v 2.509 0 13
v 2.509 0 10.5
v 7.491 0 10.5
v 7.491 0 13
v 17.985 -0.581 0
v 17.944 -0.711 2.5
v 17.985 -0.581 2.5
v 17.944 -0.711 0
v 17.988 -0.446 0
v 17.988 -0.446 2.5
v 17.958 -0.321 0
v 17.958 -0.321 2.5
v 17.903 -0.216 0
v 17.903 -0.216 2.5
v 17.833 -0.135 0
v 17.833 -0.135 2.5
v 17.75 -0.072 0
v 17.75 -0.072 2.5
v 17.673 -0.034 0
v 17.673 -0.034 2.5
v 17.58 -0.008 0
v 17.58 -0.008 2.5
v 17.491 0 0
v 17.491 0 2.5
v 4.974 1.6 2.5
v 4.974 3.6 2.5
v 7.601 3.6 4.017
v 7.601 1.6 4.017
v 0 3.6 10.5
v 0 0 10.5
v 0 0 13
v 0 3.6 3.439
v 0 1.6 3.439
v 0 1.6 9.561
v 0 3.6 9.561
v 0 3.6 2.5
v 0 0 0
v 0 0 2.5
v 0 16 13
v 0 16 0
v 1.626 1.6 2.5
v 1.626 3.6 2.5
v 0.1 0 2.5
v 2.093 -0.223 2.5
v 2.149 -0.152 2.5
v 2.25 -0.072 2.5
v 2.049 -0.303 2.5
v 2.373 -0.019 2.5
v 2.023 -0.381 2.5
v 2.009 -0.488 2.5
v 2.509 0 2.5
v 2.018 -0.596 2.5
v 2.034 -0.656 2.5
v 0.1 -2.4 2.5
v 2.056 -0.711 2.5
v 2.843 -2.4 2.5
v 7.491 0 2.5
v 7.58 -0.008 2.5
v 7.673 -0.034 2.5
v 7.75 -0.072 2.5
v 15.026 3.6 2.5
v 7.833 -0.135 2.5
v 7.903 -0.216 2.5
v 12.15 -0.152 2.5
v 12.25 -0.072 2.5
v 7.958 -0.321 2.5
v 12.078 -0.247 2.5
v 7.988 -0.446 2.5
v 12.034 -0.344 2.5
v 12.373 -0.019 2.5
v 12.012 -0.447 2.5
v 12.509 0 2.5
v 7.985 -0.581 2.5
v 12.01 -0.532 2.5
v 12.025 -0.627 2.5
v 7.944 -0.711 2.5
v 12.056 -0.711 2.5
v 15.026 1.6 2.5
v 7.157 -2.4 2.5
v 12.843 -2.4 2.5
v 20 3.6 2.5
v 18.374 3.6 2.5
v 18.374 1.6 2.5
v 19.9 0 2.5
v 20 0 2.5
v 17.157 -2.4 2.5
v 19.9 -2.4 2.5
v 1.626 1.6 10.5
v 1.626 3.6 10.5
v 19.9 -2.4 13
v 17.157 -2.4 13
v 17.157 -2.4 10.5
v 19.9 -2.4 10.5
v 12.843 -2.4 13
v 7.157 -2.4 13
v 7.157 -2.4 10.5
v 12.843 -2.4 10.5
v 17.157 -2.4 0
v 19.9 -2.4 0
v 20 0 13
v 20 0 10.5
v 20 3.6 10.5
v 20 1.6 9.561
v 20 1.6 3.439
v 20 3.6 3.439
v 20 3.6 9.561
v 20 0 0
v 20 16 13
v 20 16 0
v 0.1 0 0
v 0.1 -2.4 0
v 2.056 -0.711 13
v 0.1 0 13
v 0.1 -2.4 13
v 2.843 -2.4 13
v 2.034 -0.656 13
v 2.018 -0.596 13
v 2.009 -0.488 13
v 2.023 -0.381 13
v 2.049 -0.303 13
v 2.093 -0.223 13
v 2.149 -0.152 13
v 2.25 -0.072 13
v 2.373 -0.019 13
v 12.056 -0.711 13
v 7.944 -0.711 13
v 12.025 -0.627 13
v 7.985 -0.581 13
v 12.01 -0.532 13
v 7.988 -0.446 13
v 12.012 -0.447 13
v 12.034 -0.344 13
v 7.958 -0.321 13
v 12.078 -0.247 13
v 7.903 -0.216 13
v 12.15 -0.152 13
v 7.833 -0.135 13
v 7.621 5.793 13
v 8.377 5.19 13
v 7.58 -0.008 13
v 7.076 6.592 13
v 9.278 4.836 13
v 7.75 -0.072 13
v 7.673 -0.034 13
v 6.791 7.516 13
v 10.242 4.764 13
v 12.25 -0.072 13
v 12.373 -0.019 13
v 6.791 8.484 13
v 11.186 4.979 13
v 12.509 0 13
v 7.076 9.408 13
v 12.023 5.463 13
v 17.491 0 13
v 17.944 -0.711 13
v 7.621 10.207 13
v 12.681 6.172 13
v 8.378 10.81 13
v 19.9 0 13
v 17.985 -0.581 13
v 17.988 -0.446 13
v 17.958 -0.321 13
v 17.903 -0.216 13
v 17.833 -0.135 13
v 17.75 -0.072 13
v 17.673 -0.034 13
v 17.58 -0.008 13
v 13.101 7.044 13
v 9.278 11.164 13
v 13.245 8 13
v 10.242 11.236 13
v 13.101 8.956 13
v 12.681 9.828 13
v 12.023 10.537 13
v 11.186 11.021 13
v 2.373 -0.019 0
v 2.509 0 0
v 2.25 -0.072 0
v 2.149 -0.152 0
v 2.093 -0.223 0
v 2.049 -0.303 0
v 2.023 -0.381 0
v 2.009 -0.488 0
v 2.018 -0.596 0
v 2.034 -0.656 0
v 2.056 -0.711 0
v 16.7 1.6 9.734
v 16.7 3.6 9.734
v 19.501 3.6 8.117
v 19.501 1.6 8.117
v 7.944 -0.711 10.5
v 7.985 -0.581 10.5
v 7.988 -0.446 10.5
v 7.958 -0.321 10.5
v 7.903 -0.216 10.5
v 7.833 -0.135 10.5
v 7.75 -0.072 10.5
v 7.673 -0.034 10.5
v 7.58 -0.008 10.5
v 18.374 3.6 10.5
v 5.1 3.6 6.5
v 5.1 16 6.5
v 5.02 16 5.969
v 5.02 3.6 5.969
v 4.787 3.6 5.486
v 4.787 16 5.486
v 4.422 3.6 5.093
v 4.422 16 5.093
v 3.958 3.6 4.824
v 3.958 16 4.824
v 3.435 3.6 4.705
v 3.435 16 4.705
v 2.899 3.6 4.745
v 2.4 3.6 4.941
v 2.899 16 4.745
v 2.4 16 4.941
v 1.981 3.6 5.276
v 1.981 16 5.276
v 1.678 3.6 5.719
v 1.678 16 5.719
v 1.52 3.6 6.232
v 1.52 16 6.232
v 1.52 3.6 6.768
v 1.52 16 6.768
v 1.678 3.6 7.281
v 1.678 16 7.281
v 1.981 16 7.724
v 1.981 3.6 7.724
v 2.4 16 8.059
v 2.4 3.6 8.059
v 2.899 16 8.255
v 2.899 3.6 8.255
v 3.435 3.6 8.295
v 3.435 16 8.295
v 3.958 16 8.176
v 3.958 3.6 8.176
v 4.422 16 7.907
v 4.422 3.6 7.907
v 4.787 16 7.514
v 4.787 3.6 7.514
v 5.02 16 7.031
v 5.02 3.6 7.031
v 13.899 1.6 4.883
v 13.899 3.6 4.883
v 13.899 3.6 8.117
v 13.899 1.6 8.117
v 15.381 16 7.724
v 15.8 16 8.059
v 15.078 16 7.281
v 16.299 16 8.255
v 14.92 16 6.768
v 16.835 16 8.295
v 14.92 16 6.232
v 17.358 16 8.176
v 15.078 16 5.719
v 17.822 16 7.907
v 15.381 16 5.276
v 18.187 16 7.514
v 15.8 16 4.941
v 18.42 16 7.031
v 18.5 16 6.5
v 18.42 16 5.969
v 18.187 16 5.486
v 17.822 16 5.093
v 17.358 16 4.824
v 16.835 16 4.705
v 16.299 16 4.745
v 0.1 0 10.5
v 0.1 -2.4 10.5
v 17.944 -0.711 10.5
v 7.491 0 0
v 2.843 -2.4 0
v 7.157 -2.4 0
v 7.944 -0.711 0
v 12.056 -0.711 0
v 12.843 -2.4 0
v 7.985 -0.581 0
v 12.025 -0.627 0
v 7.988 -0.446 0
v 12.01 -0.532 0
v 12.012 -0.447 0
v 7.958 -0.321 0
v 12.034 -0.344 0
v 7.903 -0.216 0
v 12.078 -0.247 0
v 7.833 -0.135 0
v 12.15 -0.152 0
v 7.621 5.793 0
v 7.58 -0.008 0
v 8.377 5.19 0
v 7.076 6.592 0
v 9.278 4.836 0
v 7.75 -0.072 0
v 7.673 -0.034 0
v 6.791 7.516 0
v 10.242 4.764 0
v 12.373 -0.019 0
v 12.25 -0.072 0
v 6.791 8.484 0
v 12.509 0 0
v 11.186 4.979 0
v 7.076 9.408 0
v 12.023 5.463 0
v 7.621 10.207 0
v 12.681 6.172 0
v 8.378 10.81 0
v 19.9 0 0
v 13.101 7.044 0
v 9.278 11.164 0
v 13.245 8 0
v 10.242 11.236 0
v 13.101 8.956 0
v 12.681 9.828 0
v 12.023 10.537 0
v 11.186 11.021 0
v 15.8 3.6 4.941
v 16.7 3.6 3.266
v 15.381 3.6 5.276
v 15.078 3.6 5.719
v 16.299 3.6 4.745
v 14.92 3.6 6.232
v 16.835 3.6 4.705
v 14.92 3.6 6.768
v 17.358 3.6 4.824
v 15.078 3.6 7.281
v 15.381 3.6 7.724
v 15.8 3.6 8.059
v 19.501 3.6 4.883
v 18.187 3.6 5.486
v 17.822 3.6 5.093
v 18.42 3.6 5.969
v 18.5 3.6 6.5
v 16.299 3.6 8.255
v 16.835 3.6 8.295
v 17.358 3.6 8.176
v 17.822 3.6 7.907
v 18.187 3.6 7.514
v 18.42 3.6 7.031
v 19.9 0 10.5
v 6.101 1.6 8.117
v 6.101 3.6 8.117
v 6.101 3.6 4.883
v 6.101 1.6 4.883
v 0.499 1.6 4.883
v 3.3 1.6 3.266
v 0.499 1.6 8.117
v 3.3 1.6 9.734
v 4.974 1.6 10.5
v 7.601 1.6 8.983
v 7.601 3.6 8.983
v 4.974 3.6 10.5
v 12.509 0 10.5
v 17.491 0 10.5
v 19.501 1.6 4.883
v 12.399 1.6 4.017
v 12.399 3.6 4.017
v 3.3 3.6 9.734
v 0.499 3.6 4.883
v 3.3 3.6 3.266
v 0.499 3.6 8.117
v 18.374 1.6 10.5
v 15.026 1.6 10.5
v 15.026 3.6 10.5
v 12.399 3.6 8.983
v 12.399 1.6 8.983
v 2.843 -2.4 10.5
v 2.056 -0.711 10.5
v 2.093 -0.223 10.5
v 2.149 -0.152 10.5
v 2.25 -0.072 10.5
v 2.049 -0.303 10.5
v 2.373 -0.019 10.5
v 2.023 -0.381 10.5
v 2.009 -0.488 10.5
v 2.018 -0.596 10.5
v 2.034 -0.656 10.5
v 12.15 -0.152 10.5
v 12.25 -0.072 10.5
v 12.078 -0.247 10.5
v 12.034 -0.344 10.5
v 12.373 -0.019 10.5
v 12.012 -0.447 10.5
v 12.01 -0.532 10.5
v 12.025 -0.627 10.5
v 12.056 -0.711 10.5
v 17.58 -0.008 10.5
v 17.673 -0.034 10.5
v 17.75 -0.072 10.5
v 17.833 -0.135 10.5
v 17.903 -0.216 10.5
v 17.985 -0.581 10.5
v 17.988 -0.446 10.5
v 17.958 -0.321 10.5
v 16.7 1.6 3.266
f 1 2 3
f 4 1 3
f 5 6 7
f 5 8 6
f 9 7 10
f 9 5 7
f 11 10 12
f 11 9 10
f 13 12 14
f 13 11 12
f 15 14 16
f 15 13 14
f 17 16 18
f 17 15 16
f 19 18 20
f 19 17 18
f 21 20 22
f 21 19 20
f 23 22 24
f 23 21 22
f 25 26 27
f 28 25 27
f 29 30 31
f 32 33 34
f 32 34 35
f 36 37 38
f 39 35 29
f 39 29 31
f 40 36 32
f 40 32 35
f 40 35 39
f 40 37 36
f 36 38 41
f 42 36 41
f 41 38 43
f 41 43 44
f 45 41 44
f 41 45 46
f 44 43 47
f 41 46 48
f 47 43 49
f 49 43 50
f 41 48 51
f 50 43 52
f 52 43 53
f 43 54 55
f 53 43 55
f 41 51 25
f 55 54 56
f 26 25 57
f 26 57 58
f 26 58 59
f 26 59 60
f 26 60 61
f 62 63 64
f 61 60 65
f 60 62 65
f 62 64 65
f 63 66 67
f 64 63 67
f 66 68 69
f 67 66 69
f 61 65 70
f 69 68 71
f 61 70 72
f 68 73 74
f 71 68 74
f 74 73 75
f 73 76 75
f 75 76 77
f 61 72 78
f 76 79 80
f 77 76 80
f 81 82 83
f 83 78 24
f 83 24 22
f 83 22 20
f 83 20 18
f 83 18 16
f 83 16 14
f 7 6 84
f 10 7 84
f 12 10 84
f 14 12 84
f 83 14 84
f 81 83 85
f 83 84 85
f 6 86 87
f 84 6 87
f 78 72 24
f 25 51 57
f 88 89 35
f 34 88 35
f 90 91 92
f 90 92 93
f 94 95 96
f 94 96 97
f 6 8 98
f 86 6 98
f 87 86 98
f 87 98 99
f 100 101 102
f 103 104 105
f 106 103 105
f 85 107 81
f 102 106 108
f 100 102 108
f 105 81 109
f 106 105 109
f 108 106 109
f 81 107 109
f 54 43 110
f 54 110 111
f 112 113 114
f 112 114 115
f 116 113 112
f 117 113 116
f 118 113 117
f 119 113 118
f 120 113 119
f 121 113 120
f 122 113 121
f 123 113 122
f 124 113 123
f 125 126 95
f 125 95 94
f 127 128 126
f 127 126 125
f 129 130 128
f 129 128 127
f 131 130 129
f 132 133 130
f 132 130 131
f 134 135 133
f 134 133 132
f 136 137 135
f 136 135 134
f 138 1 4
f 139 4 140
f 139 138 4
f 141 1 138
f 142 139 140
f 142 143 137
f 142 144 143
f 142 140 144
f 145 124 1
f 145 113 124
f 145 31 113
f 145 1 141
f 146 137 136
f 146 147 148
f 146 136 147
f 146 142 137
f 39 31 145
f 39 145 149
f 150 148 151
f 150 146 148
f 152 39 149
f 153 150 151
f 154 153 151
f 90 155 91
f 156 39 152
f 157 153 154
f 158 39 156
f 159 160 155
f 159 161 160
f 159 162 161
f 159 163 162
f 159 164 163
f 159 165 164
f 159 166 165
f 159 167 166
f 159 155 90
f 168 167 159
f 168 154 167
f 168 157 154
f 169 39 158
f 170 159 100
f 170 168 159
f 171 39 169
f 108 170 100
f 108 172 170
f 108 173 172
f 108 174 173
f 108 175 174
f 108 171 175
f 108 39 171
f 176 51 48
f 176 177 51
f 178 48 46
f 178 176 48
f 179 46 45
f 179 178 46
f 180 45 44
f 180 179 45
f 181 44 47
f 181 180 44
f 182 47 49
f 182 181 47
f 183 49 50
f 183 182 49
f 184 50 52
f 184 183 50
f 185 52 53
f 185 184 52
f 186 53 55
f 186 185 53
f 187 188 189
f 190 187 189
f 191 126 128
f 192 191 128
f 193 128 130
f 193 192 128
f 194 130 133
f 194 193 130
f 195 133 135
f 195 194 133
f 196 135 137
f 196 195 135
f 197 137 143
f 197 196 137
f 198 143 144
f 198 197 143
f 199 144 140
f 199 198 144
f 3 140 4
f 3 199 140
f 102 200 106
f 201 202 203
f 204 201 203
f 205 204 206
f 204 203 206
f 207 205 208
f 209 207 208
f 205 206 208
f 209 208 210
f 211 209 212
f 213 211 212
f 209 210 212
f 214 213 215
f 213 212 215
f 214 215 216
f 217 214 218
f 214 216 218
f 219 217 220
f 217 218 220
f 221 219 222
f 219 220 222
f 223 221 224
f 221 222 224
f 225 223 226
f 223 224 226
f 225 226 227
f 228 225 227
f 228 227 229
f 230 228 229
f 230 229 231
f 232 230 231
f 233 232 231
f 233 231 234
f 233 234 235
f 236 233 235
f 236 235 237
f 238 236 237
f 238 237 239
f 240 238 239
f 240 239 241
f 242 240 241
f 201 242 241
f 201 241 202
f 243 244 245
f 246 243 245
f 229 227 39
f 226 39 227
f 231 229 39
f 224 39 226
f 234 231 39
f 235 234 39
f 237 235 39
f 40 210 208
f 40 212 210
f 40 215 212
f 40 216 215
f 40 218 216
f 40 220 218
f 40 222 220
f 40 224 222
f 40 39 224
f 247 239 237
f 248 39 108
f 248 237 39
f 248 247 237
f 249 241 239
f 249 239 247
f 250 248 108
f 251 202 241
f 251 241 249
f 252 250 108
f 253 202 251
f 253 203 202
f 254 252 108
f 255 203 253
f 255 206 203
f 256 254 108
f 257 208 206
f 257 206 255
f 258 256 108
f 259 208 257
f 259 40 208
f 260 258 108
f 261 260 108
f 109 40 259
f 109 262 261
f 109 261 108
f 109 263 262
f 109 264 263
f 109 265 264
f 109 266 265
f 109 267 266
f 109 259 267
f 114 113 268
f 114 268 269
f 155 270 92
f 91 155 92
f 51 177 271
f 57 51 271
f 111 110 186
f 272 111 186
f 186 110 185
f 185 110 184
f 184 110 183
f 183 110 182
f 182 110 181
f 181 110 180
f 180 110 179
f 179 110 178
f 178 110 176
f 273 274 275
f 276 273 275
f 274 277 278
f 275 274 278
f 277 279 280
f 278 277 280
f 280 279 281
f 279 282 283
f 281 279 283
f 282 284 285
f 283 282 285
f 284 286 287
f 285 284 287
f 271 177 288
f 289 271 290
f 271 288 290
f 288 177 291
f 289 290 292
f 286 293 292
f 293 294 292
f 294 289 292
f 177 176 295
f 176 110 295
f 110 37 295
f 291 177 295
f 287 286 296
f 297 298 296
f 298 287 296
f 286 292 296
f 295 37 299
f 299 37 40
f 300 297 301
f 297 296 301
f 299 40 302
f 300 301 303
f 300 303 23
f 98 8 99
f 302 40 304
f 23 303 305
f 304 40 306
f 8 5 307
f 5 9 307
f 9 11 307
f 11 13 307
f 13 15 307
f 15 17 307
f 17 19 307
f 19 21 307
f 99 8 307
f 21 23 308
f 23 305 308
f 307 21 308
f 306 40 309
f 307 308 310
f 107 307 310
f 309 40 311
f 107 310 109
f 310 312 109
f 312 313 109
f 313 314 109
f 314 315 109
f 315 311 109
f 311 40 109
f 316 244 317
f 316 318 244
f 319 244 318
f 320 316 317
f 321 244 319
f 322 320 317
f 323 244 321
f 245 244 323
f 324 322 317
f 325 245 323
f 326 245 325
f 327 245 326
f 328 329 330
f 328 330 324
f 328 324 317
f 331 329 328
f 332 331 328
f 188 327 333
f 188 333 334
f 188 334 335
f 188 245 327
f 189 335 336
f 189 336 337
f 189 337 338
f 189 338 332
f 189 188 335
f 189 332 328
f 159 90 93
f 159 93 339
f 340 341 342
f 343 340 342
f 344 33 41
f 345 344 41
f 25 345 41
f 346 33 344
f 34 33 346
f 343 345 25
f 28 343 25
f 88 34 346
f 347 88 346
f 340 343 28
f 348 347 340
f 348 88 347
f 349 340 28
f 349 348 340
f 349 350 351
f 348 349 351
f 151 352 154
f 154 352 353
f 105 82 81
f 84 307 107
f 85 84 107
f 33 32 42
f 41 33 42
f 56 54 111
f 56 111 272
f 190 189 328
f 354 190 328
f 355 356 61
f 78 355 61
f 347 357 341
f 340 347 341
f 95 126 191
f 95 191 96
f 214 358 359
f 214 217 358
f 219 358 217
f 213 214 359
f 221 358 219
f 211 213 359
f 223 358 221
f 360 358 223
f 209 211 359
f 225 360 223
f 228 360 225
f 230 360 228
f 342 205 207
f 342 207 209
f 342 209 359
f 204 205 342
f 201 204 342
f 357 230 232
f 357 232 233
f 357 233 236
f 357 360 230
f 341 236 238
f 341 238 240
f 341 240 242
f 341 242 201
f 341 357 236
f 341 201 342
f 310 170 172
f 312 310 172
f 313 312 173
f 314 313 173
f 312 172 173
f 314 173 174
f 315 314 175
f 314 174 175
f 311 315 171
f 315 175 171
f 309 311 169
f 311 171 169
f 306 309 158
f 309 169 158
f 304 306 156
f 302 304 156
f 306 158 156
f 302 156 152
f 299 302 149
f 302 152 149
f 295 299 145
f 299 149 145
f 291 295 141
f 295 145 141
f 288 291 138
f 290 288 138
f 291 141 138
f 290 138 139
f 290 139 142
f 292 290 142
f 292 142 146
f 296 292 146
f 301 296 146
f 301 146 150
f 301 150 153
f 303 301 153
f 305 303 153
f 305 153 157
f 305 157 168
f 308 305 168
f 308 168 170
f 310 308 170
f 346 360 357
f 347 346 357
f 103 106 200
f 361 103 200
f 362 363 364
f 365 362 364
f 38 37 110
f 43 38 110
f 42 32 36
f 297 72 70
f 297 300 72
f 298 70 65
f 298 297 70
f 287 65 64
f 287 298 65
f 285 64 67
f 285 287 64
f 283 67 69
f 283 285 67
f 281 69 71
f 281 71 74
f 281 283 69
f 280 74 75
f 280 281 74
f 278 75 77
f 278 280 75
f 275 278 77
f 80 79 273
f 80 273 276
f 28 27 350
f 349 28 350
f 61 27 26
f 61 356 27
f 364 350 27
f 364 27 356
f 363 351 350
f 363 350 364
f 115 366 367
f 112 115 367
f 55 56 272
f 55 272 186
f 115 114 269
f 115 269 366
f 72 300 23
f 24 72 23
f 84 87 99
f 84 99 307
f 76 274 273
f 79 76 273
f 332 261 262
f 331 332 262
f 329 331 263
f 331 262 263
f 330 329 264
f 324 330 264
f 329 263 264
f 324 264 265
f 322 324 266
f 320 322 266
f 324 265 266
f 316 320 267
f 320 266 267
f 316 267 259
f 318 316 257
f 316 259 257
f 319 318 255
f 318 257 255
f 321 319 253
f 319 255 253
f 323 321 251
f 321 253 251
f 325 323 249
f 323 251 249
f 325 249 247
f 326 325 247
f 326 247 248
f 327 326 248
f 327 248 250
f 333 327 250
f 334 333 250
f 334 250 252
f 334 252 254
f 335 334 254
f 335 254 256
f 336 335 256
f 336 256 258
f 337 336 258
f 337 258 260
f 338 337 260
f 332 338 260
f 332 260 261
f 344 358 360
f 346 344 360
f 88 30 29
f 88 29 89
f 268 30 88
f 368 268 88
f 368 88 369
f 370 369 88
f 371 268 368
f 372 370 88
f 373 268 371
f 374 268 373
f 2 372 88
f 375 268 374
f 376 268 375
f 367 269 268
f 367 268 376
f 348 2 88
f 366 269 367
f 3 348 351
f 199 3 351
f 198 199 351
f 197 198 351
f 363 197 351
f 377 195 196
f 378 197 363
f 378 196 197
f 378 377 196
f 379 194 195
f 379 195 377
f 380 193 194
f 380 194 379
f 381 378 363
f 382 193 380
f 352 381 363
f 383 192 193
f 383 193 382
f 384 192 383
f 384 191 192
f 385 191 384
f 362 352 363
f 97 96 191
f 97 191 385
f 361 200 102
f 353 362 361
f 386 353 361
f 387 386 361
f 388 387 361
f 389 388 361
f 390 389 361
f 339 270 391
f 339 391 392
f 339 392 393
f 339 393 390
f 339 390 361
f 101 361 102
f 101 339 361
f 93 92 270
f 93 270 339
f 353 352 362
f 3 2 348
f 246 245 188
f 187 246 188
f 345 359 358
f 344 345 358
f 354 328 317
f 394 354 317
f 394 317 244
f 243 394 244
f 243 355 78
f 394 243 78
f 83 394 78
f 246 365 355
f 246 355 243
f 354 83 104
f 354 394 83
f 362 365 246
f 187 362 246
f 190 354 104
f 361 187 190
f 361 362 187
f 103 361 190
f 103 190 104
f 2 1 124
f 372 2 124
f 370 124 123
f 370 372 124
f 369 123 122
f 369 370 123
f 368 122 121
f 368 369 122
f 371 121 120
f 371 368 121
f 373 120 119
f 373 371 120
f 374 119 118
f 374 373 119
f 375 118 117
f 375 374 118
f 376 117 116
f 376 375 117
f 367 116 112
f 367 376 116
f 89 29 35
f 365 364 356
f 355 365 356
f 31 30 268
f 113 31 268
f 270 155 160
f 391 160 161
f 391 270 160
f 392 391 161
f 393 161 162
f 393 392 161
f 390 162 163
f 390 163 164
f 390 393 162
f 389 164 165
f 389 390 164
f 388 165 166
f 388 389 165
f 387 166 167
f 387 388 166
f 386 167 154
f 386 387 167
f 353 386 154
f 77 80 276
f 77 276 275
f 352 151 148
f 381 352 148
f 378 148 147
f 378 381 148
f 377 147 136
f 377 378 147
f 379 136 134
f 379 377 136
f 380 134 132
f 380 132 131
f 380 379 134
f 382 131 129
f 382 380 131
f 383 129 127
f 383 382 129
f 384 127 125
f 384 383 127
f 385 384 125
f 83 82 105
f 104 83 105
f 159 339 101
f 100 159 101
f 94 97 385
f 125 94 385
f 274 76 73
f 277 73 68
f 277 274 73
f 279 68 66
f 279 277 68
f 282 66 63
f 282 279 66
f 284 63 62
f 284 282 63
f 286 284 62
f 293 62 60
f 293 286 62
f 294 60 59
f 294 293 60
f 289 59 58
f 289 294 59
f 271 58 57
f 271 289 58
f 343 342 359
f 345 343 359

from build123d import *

# Parameters (mm, degrees)
SKETCH1_W           = 20
SKETCH1_H           = 16
BOSS_EXTRUDE1_DEPTH = 13
SKETCH2_W           = 20
SKETCH2_H           = 8
CUT_EXTRUDE1_DEPTH  = 3.6
SKETCH3_R           = 1.8
CUT_EXTRUDE2_DEPTH  = 17
BOSS_EXTRUDE2_DEPTH = 2
BOSS_EXTRUDE3_DEPTH = 13
SKETCH7_W           = 20
SKETCH7_H           = 8
CUT_EXTRUDE3_DEPTH  = 4
FILLET1_R           = 0.5
SKETCH8_R           = 3.245
CUT_EXTRUDE4_DEPTH  = 14.0000001


with BuildPart() as part:
    # Sketch1 → Boss-Extrude1 (new body)
    with BuildSketch(Plane.XY):
        with Locations((10, 8)):
            Rectangle(SKETCH1_W, SKETCH1_H)
    extrude(amount=BOSS_EXTRUDE1_DEPTH)

    # Sketch2 → Cut-Extrude1 (cut)
    with BuildSketch(Plane.XZ):
        with Locations((10, 6.5)):
            Rectangle(SKETCH2_W, SKETCH2_H)
    extrude(amount=-CUT_EXTRUDE1_DEPTH, mode=Mode.SUBTRACT)

    # Sketch3 → Cut-Extrude2 (cut, through all)
    with BuildSketch(Plane(origin=(0, 16, 0), x_dir=(1, 0, 0), z_dir=(0, 1, 0))):
        with Locations((3.3, -6.5)):
            Circle(SKETCH3_R)
        with Locations((16.7, -6.5)):
            Circle(SKETCH3_R)
    extrude(amount=-CUT_EXTRUDE2_DEPTH, mode=Mode.SUBTRACT)

    # Sketch4 → Boss-Extrude2 (add)
    with BuildSketch(Plane.XZ.offset(-3.6)):
        Polygon((7.601093671, 8.983237589), (4.973984112, 10.5), (1.626015888, 10.5), (0, 9.561219289), (0, 3.438780711), (1.626015888, 2.5), (4.973984112, 2.5), (7.601093671, 4.016762411), align=None)
        Polygon((0.498906329, 8.117212185), (3.3, 9.73442437), (6.101093671, 8.117212185), (6.101093671, 4.882787815), (3.3, 3.26557563), (0.498906329, 4.882787815), align=None, mode=Mode.SUBTRACT)
        Polygon((18.373984112, 10.5), (15.026015888, 10.5), (12.398906329, 8.983237589), (12.398906329, 4.016762411), (15.026015888, 2.5), (18.373984112, 2.5), (20, 3.438780711), (20, 9.561219289), align=None)
        Polygon((13.898906329, 8.117212185), (16.7, 9.73442437), (19.501093671, 8.117212185), (19.501093671, 4.882787815), (16.7, 3.26557563), (13.898906329, 4.882787815), align=None, mode=Mode.SUBTRACT)
    extrude(amount=BOSS_EXTRUDE2_DEPTH)

    # Sketch6 → Boss-Extrude3 (add)
    with BuildSketch(Plane.XY.offset(13)):
        Polygon((0.1, 0), (0.1, -2.4), (2.843031442, -2.4), (1.743600076, -0.042261826), (1.723893063, 0), align=None)
        Polygon((12.843031442, -2.4), (11.743600076, -0.042261826), (11.723893063, 0), (8.276106937, 0), (8.256399924, -0.042261826), (7.156968558, -2.4), align=None)
        Polygon((19.9, -2.4), (19.9, 0), (18.276106937, 0), (18.256399924, -0.042261826), (17.156968558, -2.4), align=None)
    extrude(amount=-BOSS_EXTRUDE3_DEPTH)

    # Sketch7 → Cut-Extrude3 (cut)
    with BuildSketch(Plane.XZ.offset(2.4)):
        with Locations((10, 6.5)):
            Rectangle(SKETCH7_W, SKETCH7_H)
    extrude(amount=-CUT_EXTRUDE3_DEPTH, mode=Mode.SUBTRACT)

    # Fillet1
    fillet1_edges = [part.edges().sort_by_distance(p)[0] for p in [
        (1.723893063, 0, 1.25),
        (1.723893063, 0, 11.75),
        (8.276106937, 0, 1.25),
        (11.723893063, 0, 1.25),
        (11.723893063, 0, 11.75),
        (8.276106937, 0, 11.75),
        (18.276106937, 0, 1.25),
        (18.276106937, 0, 11.75),
    ]]
    fillet(fillet1_edges, radius=FILLET1_R)

    # Sketch8 → Cut-Extrude4 (cut, through all)
    with BuildSketch(Plane.XY.offset(13)):
        with Locations((10, 8)):
            Circle(SKETCH8_R)
    extrude(amount=-CUT_EXTRUDE4_DEPTH, mode=Mode.SUBTRACT)


solid = part.part
